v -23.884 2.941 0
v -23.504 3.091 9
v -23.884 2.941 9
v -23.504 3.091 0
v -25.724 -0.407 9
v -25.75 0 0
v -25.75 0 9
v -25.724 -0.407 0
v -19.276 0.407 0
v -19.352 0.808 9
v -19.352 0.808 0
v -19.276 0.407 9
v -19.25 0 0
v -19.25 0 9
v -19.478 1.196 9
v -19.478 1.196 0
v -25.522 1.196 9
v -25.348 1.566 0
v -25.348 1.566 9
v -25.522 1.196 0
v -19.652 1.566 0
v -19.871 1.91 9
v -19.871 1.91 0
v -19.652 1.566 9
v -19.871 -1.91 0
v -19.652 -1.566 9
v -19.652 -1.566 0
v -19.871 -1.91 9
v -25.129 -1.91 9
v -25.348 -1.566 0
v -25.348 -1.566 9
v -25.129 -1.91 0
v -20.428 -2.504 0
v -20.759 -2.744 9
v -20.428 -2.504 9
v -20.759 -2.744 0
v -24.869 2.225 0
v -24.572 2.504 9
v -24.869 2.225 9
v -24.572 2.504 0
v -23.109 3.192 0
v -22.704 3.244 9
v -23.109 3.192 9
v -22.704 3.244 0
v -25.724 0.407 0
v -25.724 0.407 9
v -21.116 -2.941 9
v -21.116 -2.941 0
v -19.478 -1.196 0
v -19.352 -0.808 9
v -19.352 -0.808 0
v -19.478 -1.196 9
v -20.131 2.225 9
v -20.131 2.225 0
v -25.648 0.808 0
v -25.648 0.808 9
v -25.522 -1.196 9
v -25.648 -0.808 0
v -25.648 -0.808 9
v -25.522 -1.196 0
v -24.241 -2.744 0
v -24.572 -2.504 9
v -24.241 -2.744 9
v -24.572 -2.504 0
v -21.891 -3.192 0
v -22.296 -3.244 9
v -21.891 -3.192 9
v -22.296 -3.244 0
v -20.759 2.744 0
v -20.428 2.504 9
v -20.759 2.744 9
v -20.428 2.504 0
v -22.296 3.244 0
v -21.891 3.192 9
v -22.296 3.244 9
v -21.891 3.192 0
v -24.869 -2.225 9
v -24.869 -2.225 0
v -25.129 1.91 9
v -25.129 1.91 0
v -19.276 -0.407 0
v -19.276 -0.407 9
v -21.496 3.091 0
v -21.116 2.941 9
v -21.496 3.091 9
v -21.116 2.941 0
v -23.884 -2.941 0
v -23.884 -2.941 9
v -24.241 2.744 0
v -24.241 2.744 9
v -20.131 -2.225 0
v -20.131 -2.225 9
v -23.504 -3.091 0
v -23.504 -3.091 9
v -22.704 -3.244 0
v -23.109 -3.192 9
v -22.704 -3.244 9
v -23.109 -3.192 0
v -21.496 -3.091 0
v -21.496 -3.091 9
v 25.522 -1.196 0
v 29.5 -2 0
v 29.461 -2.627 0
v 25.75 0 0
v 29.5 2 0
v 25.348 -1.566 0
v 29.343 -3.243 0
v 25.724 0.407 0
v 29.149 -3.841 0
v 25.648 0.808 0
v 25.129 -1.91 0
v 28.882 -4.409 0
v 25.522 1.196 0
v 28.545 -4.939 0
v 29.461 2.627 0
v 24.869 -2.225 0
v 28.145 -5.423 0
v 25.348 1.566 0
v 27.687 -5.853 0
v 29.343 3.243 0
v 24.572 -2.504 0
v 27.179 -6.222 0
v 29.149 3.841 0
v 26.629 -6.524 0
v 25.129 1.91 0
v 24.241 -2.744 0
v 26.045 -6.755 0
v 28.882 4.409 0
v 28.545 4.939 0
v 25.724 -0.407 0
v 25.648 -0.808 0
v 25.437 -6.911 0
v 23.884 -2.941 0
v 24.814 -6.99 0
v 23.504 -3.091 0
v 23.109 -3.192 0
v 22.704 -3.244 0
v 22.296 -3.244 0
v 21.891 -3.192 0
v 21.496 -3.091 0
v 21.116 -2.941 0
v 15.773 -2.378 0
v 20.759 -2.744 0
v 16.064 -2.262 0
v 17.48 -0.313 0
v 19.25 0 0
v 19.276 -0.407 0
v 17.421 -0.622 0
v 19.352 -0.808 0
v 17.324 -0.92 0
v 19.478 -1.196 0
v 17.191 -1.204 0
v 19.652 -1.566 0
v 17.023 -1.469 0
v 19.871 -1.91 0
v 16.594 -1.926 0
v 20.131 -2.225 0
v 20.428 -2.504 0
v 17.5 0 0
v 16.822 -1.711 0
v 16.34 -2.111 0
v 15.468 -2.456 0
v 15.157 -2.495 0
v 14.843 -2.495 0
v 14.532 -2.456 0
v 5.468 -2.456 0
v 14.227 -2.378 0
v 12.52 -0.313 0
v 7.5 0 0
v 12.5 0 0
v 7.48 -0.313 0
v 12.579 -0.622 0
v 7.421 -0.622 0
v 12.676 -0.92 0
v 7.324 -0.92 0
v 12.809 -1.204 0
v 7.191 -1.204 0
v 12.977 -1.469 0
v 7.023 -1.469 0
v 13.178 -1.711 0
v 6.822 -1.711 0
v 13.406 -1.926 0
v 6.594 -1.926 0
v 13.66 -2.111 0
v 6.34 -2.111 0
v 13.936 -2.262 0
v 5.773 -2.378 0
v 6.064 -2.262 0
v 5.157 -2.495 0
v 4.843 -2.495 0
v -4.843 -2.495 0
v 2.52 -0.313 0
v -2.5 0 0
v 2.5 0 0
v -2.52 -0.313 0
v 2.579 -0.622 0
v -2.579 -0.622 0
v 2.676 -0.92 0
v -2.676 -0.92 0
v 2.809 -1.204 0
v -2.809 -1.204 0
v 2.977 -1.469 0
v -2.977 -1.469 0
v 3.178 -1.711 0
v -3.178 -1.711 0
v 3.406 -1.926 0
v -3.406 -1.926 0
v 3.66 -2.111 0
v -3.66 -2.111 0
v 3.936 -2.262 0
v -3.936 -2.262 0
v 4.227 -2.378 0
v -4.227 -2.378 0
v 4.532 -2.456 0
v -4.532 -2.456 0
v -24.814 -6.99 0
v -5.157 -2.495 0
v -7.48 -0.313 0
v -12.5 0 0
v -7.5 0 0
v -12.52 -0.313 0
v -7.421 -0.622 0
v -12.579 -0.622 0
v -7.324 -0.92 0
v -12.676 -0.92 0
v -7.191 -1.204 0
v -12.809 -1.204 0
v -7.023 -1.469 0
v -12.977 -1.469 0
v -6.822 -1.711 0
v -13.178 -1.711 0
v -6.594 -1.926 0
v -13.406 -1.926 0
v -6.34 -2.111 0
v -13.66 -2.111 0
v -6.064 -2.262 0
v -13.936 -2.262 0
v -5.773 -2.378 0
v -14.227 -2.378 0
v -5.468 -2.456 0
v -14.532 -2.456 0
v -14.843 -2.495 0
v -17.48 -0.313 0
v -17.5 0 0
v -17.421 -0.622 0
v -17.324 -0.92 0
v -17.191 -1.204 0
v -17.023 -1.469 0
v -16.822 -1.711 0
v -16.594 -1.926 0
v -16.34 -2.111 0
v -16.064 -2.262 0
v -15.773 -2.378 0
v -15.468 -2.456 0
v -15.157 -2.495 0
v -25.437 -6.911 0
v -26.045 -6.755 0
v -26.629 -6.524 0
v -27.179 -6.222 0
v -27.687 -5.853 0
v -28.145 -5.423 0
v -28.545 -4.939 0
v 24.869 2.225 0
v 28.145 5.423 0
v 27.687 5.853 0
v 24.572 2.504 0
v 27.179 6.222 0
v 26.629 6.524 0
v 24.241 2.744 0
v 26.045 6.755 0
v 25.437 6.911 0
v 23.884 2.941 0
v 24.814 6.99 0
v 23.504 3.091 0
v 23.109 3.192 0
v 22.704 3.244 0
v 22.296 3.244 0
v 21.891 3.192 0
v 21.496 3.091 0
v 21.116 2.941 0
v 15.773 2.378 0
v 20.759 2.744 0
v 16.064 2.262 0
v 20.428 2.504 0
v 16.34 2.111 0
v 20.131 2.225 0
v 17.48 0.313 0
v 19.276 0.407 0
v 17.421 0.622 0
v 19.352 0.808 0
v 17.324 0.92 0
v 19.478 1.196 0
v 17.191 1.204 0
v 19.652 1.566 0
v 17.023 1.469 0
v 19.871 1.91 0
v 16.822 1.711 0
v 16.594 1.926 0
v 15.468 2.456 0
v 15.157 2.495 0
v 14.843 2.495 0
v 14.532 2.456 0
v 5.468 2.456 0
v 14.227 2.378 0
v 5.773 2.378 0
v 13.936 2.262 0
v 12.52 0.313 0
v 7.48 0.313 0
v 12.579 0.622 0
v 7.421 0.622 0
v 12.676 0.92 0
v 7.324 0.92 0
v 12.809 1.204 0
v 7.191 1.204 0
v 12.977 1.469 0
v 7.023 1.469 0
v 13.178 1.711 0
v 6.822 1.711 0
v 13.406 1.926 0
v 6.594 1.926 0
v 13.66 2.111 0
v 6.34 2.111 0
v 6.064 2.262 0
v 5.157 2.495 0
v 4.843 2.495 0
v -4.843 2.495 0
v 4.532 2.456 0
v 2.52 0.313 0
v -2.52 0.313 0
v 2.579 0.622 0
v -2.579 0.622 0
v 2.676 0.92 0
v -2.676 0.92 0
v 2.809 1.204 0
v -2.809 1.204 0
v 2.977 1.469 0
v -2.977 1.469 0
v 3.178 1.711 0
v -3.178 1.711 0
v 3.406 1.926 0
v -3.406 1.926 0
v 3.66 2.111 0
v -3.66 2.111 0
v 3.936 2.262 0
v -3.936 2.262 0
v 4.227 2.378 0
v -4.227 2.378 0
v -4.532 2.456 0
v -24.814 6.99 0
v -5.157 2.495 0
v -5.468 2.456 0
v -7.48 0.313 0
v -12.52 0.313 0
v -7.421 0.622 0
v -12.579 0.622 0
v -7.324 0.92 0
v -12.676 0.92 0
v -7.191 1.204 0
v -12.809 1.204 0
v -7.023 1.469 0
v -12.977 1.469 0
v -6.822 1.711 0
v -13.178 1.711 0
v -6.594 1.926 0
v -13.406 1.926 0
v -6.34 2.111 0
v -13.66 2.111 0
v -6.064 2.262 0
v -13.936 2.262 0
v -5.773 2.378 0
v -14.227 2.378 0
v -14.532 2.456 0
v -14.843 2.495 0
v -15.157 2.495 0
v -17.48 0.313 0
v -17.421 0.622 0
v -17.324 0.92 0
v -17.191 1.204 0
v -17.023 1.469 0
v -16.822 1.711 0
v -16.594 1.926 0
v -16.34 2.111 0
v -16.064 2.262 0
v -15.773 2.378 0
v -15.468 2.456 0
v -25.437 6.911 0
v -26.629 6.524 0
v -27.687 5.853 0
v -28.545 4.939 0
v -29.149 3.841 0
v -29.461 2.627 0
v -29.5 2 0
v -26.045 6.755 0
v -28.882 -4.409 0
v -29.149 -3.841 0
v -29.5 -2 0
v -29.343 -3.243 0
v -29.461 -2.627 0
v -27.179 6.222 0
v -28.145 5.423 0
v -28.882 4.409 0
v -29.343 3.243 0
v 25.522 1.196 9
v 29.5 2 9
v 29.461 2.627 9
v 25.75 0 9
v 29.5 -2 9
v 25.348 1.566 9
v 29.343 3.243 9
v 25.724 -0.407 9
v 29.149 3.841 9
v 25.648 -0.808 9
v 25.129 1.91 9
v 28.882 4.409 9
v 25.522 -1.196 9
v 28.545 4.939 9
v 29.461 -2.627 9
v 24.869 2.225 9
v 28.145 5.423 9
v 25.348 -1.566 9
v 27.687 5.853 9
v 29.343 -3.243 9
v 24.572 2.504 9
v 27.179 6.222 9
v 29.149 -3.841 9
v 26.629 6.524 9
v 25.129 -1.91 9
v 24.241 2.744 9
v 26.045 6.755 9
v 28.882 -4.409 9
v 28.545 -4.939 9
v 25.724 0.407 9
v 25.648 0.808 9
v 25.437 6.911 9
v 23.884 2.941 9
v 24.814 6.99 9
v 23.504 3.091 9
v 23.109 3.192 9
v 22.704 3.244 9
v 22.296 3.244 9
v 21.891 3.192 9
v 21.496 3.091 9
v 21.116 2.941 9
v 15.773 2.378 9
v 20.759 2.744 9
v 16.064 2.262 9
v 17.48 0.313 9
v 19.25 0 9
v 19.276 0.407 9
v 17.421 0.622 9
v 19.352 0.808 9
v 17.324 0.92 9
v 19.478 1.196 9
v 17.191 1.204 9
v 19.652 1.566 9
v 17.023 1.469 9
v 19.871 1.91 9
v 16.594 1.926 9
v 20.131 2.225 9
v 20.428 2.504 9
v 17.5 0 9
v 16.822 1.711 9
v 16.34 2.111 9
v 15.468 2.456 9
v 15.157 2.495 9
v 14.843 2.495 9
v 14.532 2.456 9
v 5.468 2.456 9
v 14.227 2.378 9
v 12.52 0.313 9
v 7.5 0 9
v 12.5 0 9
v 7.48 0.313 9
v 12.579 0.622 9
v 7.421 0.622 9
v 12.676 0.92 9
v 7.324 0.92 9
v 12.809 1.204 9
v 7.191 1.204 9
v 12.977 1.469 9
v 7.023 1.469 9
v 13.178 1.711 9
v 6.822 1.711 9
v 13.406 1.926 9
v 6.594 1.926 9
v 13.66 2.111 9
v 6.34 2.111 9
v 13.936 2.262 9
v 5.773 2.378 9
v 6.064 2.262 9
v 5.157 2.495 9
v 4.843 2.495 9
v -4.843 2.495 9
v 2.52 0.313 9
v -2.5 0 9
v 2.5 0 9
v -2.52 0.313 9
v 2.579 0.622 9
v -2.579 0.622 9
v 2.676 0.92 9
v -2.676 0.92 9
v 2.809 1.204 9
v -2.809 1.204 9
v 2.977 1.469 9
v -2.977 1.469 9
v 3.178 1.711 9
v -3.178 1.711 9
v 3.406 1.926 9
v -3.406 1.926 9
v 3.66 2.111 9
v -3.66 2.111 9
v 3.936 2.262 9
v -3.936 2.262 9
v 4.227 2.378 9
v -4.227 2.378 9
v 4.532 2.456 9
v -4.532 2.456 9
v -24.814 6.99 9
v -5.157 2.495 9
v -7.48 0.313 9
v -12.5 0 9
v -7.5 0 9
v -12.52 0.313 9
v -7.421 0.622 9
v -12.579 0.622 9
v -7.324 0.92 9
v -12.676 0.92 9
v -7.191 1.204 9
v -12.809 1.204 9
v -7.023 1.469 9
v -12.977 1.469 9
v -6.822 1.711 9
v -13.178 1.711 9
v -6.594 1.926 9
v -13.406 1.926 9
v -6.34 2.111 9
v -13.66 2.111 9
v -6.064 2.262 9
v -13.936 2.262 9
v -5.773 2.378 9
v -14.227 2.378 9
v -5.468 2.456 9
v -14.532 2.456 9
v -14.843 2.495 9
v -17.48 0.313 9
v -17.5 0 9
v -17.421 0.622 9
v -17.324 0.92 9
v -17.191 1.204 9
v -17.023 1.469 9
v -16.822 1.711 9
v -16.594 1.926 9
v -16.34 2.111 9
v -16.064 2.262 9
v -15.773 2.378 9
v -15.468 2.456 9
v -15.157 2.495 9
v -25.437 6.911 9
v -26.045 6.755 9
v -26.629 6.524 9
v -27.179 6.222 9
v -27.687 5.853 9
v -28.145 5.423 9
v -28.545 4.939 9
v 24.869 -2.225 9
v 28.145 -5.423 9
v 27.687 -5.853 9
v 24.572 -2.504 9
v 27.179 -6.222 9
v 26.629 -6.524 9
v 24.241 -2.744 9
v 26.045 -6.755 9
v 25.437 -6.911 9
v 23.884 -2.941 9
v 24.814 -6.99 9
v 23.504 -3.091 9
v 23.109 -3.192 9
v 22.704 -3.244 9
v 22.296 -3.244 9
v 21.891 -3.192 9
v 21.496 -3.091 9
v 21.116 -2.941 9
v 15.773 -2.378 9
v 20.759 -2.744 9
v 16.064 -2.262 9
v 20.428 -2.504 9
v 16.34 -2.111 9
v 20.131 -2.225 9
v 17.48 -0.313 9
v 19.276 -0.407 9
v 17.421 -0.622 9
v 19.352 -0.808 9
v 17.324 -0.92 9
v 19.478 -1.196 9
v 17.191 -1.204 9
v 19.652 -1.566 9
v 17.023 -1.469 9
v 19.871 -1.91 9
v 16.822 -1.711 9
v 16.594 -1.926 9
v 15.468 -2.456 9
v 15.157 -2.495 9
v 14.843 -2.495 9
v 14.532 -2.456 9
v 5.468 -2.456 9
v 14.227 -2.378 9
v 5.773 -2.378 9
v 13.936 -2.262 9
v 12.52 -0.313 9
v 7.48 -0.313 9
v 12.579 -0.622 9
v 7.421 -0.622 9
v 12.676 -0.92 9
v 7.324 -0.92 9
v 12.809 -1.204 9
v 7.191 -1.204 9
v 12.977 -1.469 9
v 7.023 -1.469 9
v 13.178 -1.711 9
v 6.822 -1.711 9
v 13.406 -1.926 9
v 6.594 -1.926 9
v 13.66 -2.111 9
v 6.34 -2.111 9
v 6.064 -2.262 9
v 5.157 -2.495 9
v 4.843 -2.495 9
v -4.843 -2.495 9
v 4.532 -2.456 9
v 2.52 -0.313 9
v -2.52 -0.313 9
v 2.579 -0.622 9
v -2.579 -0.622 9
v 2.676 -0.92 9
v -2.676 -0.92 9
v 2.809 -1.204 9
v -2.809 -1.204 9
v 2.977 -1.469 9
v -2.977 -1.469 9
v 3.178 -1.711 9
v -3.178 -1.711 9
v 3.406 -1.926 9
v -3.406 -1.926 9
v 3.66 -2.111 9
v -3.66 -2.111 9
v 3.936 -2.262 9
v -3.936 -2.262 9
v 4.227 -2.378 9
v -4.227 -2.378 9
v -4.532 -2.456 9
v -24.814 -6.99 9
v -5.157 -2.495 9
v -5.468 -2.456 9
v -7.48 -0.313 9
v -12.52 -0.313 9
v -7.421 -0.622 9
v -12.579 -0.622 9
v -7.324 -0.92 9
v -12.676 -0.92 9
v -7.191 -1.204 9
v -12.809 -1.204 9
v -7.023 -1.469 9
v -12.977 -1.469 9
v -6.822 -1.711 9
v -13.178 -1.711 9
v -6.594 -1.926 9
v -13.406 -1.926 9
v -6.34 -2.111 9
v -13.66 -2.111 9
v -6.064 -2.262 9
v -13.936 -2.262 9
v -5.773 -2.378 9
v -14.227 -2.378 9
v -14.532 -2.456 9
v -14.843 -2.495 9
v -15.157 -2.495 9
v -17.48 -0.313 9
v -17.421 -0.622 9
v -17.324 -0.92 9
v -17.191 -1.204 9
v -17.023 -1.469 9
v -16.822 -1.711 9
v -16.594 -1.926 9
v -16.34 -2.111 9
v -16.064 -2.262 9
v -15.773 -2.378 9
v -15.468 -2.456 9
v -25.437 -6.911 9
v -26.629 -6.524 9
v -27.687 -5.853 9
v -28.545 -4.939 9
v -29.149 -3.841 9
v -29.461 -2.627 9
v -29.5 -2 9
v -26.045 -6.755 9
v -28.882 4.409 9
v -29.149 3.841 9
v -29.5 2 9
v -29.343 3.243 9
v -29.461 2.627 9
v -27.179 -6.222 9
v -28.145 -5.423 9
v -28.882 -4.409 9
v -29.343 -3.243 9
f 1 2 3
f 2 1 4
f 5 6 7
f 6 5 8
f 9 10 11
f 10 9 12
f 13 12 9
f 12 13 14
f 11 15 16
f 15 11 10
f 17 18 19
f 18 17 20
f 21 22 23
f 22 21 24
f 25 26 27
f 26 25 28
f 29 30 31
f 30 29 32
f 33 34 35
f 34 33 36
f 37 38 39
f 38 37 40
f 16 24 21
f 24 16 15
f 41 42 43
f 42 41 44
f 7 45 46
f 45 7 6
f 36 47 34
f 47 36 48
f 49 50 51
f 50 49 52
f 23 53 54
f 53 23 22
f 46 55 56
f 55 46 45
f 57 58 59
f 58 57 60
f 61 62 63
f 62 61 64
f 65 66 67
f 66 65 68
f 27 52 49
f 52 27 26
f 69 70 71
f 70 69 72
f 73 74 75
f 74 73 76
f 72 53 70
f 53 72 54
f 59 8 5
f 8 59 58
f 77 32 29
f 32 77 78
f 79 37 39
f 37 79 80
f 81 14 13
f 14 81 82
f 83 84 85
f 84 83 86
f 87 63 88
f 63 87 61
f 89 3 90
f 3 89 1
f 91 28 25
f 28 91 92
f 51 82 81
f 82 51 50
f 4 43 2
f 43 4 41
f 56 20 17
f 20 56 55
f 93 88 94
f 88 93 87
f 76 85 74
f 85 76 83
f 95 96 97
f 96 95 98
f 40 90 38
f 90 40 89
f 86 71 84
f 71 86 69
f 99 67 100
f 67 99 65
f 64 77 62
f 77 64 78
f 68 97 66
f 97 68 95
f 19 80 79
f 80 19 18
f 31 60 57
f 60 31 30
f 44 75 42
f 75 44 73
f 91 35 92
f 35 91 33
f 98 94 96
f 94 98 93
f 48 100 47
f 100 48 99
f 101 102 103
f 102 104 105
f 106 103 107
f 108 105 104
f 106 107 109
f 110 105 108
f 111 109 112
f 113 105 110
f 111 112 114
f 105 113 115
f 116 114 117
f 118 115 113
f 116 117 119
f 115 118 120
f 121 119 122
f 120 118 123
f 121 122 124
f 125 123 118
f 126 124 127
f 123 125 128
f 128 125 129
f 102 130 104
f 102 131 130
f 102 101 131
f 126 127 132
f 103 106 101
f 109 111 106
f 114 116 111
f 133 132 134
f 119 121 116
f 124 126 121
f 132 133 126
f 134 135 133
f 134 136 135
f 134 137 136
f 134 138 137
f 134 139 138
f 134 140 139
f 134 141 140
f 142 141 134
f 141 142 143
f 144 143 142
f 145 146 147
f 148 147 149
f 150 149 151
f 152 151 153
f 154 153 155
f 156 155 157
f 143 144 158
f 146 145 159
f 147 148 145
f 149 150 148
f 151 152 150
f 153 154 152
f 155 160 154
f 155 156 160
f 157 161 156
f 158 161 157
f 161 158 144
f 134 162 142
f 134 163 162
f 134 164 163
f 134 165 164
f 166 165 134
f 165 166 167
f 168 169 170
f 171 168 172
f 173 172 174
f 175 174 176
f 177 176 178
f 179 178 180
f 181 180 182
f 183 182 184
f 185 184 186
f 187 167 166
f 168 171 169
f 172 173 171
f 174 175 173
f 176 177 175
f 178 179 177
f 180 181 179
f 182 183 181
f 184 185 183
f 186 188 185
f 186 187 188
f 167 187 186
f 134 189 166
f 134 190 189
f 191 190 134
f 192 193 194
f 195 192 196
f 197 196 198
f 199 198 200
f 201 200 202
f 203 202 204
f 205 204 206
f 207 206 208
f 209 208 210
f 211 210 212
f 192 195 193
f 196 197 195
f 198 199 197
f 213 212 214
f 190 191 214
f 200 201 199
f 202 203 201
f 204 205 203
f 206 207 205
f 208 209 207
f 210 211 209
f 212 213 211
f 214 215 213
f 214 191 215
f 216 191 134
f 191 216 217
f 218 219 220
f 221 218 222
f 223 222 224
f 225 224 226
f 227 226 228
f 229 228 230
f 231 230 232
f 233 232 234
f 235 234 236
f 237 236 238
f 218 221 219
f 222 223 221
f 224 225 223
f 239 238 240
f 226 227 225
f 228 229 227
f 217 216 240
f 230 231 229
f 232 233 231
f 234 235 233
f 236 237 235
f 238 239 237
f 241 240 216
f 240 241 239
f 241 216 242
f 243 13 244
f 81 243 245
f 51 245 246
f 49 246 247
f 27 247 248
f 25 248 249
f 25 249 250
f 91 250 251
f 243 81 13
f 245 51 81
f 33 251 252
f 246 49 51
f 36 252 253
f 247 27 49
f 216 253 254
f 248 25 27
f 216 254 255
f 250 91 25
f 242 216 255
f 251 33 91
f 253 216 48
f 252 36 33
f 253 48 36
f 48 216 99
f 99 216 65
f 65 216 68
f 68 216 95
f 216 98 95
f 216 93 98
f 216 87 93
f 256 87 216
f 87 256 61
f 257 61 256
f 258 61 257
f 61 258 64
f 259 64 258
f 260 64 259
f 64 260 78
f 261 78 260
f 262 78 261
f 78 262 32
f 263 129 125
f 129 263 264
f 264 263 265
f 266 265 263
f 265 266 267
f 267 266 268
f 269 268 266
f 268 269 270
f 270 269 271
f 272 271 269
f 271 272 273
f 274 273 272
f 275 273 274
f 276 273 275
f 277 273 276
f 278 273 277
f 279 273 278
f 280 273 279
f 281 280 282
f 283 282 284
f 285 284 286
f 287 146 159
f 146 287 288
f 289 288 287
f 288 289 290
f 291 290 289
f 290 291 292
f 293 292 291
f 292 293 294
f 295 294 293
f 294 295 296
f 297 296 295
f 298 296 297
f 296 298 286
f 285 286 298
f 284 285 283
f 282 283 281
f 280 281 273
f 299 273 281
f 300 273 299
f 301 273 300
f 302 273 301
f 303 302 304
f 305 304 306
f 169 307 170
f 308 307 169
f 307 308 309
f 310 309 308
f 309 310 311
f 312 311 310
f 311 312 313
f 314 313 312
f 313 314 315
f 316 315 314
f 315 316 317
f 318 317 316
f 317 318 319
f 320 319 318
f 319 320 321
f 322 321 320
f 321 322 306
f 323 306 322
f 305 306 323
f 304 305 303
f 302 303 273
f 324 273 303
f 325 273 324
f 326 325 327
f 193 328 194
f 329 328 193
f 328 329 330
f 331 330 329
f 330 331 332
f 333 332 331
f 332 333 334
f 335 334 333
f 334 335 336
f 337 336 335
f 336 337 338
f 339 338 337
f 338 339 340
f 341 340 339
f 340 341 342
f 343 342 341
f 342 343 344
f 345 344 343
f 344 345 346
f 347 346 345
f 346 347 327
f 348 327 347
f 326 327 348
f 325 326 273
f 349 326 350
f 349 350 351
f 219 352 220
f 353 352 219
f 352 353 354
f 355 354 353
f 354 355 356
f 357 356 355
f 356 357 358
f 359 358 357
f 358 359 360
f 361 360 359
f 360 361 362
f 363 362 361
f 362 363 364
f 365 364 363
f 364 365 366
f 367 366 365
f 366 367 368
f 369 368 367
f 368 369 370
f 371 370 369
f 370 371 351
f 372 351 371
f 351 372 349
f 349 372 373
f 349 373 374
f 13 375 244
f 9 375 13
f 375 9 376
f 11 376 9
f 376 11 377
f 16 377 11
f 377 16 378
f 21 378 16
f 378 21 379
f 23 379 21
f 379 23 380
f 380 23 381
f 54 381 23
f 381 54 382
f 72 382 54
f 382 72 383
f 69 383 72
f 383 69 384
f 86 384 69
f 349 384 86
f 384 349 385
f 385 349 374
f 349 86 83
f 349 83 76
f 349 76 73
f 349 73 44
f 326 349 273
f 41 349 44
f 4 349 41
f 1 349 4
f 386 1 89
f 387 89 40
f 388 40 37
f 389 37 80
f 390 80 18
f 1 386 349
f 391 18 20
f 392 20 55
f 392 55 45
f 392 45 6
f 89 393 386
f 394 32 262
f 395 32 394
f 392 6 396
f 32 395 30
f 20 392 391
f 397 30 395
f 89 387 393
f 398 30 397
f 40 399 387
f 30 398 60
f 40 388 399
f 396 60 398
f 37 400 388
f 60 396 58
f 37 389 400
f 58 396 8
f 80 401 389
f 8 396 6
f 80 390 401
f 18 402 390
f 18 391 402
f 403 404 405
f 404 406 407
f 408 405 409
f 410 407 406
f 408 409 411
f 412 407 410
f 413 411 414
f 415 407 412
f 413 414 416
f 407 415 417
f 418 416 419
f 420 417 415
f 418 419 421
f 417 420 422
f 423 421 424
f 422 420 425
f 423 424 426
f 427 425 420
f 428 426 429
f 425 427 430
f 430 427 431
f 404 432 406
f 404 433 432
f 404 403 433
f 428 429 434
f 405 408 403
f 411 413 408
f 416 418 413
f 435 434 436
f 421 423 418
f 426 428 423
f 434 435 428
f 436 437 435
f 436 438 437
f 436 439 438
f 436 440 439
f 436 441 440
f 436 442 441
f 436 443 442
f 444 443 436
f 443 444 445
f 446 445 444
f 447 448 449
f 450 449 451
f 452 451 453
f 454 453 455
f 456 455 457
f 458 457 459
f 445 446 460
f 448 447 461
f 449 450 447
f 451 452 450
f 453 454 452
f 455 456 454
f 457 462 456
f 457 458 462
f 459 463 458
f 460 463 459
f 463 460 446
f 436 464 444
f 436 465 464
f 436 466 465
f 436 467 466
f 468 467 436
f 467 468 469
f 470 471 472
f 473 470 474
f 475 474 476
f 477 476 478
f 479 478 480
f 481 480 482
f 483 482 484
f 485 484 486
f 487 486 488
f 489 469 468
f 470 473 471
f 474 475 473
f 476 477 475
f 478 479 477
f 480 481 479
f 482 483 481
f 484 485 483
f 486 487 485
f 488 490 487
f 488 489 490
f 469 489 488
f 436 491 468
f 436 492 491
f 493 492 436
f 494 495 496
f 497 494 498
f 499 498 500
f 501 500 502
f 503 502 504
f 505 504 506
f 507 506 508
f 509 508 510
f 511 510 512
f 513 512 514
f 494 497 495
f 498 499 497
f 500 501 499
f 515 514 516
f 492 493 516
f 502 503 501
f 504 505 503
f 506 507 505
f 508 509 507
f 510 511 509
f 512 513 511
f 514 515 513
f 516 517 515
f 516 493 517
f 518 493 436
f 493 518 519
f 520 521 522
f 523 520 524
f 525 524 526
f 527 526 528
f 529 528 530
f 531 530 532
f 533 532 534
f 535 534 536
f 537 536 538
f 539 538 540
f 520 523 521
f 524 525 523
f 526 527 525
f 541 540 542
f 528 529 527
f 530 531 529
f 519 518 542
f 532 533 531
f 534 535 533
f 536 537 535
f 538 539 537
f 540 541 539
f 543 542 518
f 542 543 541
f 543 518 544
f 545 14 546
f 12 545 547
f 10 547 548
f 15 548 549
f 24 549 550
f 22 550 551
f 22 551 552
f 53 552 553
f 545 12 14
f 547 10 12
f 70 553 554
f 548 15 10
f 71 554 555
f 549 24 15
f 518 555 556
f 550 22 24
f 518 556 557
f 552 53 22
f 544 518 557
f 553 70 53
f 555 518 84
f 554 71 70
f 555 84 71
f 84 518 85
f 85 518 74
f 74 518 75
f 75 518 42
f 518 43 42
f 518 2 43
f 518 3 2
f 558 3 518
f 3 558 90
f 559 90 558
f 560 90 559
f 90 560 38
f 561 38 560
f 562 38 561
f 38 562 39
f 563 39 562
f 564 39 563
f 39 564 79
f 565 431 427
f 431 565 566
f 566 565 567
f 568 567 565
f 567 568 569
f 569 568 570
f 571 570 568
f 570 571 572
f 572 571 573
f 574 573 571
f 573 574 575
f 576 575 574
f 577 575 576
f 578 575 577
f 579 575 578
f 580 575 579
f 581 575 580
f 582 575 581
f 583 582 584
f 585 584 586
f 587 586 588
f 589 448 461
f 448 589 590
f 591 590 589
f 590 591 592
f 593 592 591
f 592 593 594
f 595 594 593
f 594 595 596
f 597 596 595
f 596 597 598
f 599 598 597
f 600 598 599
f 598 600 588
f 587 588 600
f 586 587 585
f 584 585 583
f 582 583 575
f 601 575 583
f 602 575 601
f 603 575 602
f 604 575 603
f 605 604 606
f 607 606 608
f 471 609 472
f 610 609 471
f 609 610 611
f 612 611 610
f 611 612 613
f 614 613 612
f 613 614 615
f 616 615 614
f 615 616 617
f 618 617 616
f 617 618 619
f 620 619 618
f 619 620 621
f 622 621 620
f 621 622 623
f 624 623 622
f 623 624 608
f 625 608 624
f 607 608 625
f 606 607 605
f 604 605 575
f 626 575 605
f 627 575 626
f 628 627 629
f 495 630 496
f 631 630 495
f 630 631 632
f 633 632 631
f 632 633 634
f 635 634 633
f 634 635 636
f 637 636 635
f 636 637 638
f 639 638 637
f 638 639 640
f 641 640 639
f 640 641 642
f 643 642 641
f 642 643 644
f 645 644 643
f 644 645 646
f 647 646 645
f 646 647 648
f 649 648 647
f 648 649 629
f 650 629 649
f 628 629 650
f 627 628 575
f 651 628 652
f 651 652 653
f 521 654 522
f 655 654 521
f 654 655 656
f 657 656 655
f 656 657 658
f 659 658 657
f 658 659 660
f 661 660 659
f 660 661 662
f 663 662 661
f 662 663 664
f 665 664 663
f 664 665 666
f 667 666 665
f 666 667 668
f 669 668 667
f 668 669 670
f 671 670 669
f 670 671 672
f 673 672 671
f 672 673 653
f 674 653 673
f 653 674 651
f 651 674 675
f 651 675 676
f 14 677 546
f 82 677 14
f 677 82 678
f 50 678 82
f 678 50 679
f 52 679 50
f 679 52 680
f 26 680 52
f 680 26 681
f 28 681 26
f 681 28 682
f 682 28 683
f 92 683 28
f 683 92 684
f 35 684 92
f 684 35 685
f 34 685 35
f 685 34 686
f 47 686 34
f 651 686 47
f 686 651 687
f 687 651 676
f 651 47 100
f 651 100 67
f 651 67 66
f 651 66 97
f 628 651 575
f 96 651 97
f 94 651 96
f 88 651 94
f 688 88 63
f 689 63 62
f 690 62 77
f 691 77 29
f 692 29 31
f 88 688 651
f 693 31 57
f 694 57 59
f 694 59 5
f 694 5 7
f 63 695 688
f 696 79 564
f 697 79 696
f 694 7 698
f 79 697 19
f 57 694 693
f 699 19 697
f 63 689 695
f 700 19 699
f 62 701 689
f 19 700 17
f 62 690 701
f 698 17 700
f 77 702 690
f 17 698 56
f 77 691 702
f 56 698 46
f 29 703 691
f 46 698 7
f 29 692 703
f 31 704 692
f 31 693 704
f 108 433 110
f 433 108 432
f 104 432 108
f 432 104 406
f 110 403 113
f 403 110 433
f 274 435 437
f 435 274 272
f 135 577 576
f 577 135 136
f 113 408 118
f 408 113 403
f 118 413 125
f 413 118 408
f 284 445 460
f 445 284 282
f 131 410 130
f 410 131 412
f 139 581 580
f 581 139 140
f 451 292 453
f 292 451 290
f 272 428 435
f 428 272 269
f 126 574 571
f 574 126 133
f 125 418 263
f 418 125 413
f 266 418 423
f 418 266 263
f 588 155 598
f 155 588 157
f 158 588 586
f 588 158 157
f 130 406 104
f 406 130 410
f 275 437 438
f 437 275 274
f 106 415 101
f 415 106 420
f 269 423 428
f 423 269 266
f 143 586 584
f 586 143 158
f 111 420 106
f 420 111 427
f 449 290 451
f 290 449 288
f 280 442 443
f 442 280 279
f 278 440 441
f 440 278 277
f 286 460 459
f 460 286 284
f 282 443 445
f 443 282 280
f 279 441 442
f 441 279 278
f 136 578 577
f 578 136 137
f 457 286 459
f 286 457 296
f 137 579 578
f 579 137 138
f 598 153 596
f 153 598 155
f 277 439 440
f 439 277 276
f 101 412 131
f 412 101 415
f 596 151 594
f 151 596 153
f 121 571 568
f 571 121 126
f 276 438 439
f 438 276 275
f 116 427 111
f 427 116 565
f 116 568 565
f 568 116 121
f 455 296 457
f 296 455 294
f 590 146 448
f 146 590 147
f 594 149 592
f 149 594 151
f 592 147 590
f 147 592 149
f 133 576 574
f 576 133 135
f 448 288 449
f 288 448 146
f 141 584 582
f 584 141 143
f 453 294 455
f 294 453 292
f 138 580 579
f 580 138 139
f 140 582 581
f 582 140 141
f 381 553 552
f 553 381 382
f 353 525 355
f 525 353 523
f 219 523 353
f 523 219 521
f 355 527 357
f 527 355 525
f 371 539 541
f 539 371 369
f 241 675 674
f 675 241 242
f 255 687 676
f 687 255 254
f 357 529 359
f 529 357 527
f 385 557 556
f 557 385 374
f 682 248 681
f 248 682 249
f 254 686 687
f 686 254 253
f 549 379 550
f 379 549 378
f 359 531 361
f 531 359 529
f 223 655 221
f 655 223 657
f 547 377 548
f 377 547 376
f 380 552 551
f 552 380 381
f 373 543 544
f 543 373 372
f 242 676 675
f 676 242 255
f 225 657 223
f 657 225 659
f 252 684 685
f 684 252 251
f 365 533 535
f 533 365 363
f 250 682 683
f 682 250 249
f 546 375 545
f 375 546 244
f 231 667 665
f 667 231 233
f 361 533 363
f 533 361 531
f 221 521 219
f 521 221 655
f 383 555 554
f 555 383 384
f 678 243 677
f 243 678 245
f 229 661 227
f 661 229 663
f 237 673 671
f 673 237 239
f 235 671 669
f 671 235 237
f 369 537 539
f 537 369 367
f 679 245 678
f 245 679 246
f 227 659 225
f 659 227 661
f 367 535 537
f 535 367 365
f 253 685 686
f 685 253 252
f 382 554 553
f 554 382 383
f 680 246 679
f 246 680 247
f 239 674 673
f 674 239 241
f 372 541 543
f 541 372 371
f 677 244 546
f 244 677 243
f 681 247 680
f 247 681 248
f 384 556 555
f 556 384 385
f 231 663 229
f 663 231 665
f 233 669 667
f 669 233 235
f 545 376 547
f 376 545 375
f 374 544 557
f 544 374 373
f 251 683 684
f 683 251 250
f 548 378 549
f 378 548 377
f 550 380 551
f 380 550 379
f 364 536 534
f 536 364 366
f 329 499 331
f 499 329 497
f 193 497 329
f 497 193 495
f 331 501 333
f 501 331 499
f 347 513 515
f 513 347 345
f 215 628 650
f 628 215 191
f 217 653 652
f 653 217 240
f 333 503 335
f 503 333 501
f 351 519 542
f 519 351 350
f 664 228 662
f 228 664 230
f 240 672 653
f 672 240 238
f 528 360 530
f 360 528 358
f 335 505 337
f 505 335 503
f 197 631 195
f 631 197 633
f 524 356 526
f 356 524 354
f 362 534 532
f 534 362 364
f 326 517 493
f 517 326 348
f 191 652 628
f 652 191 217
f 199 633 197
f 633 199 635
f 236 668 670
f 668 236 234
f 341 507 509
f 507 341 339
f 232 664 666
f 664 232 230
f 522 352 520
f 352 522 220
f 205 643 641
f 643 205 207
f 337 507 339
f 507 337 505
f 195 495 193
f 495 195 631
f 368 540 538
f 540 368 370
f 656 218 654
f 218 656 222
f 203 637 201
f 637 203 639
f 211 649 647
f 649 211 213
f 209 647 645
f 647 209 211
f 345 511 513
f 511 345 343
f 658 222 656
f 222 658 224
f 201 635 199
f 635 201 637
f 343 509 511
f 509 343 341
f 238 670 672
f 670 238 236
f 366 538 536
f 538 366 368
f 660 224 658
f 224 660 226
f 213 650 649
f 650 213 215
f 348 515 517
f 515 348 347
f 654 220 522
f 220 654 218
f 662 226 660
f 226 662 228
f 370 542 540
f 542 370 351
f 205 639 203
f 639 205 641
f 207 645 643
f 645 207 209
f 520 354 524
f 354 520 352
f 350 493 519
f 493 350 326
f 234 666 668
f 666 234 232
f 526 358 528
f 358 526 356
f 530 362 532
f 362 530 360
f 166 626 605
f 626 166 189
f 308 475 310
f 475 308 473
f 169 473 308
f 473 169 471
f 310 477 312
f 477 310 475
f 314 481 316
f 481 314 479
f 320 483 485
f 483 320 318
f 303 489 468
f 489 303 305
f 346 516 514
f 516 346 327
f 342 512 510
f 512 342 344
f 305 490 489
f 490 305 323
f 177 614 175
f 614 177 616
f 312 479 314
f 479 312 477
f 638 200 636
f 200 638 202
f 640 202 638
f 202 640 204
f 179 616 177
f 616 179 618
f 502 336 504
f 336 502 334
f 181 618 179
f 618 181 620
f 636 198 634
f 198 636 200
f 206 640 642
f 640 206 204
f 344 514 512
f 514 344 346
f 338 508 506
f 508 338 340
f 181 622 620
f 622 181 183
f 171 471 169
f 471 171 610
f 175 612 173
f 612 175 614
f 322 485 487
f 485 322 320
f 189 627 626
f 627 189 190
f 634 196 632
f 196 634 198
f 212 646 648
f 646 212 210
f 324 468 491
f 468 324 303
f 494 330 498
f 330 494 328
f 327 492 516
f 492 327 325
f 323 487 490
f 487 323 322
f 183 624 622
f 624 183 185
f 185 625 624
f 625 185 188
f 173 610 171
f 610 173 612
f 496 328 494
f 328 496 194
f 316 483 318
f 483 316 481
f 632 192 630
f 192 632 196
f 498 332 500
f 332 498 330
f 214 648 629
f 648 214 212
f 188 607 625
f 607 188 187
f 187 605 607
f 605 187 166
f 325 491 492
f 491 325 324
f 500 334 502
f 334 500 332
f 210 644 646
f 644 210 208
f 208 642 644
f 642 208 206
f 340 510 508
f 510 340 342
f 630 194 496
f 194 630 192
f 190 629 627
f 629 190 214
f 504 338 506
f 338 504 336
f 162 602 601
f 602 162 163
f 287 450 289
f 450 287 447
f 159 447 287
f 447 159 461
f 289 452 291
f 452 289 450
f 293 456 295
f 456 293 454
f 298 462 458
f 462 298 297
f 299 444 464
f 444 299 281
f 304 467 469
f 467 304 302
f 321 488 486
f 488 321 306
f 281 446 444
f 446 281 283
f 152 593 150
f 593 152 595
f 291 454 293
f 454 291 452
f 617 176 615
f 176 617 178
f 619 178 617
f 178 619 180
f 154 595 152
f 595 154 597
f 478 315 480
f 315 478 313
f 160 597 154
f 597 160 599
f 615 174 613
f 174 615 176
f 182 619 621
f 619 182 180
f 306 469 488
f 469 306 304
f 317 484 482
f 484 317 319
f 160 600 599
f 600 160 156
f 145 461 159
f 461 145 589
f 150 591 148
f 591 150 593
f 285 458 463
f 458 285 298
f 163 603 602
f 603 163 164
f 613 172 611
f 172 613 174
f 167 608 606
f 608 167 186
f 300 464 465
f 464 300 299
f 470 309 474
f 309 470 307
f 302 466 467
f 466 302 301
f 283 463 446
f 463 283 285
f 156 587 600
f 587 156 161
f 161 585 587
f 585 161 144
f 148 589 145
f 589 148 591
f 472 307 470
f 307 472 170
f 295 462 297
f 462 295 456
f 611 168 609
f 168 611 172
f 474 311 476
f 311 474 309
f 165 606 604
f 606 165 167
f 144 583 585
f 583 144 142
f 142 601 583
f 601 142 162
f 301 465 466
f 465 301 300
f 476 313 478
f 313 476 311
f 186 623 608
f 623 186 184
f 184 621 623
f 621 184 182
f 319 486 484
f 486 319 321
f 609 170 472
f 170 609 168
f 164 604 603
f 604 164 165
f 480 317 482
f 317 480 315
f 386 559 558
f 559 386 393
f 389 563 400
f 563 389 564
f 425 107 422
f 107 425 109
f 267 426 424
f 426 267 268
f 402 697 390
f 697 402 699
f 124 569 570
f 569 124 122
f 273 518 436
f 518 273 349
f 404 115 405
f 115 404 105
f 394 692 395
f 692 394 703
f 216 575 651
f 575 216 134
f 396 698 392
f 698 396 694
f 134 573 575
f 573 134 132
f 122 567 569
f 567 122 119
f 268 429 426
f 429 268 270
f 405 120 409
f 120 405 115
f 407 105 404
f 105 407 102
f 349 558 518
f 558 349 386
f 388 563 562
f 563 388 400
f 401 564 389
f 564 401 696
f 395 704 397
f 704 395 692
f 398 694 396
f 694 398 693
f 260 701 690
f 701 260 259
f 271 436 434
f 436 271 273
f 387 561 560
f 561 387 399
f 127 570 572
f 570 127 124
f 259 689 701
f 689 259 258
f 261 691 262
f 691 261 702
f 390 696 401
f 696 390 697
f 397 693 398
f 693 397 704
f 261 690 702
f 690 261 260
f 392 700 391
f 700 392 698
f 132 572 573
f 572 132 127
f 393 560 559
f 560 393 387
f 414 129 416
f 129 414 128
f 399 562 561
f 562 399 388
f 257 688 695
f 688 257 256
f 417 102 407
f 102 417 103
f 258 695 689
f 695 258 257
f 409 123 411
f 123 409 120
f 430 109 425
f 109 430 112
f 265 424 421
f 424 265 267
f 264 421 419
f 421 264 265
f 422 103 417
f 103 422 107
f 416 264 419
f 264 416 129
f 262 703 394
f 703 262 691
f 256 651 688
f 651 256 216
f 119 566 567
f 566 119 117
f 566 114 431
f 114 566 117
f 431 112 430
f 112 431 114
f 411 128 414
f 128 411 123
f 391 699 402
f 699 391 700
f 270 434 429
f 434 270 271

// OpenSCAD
$fn = 50;

difference() {
	union() {
		hull() {
			translate(v = [-24.5, 2.0, 0]) {
				cylinder(h = 9, r = 5);
			}
			translate(v = [24.5, 2.0, 0]) {
				cylinder(h = 9, r = 5);
			}
			translate(v = [-24.5, -2.0, 0]) {
				cylinder(h = 9, r = 5);
			}
			translate(v = [24.5, -2.0, 0]) {
				cylinder(h = 9, r = 5);
			}
		}
	}
	union() {
		translate(v = [-22.5, 0.0, 0]) {
			cylinder(h = 9, r = 3.25);
		}
		translate(v = [22.5, 0.0, 0]) {
			cylinder(h = 9, r = 3.25);
		}
		translate(v = [-15.0, 0, 0.0]) {
			cylinder(h = 9, r = 2.5);
		}
		translate(v = [-5.0, 0, 0.0]) {
			cylinder(h = 9, r = 2.5);
		}
		translate(v = [5.0, 0, 0.0]) {
			cylinder(h = 9, r = 2.5);
		}
		translate(v = [15.0, 0, 0.0]) {
			cylinder(h = 9, r = 2.5);
		}
	}
}
